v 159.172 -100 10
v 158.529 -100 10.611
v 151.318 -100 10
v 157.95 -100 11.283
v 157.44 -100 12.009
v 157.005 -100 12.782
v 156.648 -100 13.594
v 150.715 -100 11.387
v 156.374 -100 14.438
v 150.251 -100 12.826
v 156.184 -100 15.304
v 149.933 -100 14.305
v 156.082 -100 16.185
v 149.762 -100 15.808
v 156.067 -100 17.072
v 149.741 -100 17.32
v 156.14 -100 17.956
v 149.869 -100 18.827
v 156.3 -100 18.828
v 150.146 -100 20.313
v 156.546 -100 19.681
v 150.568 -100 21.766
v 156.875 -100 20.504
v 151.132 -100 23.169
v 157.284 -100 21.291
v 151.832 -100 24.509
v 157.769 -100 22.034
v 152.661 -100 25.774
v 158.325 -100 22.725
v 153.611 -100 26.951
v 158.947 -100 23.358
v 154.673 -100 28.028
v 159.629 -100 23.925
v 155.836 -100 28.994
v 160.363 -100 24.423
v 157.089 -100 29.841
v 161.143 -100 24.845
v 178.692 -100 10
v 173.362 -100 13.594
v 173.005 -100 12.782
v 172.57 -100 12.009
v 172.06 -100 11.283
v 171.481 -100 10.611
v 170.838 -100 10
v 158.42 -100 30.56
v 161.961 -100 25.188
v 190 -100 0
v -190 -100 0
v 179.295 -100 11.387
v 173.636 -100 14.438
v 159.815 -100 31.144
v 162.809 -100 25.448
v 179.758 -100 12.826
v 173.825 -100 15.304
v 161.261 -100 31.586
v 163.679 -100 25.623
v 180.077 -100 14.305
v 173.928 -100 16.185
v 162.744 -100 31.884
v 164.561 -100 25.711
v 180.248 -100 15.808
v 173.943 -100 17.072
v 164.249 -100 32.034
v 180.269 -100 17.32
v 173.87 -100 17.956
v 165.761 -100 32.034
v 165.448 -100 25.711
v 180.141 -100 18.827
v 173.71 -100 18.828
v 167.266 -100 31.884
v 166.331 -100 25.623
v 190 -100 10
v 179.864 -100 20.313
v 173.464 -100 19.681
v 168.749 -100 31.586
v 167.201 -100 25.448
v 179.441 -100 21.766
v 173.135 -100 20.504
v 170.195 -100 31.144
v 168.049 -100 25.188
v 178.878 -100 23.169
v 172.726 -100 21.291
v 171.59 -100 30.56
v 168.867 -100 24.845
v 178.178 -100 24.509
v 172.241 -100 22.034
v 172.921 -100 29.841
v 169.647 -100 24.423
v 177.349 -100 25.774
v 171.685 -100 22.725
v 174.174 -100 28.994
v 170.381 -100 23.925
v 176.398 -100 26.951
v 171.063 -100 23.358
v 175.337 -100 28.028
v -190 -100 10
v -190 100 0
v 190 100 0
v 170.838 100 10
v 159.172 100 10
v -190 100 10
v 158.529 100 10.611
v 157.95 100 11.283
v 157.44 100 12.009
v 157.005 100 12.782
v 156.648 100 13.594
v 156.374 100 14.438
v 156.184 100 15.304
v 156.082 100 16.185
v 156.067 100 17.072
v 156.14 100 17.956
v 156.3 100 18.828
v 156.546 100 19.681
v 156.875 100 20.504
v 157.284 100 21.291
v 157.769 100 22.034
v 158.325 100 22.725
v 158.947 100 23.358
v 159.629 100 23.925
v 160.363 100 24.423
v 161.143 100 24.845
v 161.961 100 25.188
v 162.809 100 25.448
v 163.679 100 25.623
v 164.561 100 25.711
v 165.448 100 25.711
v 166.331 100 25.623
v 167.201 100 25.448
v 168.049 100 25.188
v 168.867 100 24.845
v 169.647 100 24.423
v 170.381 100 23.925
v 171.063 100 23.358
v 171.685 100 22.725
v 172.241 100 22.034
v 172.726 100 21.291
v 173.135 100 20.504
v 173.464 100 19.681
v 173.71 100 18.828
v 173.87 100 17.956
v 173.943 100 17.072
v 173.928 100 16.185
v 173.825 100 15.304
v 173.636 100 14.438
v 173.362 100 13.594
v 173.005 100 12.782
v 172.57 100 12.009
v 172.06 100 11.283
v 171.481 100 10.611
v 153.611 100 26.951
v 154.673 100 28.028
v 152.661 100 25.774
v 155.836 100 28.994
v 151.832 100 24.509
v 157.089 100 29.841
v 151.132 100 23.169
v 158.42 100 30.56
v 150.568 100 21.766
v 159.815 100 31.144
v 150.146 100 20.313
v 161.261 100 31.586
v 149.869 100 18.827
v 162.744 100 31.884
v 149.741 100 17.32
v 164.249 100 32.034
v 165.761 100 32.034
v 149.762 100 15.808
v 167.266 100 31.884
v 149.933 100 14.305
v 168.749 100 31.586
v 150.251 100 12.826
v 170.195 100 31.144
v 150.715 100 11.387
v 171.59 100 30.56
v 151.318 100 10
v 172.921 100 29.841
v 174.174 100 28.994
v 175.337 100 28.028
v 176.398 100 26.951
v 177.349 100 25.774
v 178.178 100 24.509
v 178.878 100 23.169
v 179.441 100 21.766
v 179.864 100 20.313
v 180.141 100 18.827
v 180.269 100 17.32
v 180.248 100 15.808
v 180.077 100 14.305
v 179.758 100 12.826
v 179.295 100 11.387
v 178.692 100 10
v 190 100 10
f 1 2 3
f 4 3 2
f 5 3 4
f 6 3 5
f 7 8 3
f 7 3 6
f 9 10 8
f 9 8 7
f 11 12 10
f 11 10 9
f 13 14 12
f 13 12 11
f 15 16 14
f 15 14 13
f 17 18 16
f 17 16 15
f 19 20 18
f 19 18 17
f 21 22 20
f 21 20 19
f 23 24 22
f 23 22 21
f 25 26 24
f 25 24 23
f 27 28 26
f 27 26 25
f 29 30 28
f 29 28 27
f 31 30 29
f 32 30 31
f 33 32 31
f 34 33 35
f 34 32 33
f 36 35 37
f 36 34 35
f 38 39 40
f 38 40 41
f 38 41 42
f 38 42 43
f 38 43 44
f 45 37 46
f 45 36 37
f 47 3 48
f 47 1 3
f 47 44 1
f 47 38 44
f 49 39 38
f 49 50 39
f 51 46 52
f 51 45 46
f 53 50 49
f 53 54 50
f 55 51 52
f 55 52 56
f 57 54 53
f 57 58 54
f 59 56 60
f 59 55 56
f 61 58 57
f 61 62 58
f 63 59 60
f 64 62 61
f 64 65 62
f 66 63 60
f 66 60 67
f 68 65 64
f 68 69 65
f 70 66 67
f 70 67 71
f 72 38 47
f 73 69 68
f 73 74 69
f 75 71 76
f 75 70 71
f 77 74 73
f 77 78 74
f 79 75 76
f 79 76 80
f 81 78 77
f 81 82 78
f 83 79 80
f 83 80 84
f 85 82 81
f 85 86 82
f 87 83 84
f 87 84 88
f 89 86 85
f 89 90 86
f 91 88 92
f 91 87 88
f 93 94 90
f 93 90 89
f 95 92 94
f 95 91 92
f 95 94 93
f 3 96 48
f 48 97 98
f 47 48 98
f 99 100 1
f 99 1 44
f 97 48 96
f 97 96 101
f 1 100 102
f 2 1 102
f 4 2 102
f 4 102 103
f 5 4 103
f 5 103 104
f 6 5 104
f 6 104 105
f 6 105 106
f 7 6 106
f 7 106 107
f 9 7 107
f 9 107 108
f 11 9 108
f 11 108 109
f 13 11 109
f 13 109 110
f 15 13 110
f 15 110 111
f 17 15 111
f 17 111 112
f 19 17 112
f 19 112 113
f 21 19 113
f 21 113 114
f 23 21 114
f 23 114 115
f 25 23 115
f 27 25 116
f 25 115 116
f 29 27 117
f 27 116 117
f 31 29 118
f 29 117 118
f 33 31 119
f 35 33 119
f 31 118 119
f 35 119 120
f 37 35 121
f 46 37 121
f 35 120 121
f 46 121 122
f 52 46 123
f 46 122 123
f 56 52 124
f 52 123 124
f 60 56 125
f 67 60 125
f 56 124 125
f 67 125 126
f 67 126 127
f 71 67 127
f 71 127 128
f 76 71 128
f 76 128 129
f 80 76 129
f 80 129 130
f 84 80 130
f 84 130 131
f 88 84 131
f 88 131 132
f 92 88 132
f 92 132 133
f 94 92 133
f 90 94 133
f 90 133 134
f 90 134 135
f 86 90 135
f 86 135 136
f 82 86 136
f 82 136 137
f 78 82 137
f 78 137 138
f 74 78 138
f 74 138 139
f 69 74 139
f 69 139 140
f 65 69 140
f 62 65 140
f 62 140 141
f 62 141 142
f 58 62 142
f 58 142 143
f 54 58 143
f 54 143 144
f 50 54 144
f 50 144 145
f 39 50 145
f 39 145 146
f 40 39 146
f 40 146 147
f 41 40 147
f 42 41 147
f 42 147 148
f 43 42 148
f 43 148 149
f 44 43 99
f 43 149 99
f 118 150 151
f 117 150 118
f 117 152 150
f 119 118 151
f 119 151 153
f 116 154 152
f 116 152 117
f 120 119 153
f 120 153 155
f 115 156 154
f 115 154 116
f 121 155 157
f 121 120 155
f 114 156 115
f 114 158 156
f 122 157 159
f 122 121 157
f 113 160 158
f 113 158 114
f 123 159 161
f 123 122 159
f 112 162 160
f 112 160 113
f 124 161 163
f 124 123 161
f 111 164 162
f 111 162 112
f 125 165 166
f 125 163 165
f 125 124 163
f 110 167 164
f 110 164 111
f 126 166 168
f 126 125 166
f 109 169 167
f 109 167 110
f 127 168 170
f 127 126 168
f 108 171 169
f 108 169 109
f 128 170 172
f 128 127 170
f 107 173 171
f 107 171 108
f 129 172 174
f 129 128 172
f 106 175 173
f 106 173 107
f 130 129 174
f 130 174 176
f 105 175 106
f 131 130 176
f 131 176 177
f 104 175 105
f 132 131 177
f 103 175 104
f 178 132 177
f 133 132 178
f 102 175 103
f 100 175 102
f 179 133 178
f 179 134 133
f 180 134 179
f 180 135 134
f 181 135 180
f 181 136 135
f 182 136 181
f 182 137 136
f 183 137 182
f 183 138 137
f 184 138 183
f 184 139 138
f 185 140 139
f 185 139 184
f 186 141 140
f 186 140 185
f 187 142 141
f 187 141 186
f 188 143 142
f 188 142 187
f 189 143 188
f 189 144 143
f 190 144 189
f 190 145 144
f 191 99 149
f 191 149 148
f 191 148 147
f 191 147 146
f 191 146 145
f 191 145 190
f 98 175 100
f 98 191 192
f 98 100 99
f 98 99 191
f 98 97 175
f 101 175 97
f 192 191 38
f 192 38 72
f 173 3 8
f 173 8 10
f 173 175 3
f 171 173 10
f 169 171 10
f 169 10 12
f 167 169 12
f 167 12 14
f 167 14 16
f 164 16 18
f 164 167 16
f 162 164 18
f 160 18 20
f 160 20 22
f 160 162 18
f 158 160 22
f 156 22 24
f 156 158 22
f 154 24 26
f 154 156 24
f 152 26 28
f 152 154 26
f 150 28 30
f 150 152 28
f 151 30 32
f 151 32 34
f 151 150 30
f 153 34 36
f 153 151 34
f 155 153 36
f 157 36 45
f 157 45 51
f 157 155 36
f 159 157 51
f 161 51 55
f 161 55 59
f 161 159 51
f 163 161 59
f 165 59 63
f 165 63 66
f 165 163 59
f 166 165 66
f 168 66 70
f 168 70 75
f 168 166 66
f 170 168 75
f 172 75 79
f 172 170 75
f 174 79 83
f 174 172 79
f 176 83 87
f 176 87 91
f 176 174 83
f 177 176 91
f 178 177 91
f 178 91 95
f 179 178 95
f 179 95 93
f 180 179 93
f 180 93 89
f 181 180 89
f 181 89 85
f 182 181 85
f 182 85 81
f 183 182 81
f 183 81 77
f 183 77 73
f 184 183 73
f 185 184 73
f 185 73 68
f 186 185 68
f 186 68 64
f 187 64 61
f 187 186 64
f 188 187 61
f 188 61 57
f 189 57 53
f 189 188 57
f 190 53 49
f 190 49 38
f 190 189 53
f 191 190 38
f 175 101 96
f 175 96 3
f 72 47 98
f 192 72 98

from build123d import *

# Parameters (mm, degrees)
SKETCH1_W                       = 380
SKETCH1_H                       = 200
FOOT_DEPTH                      = 10
BOSS_EXTRUDE2_REACH             = 216.942
SKETCH2_R                       = 15.273641531
SKETCH2_R_2                     = 8.942985805
BOSS_EXTRUDE2_DIRECTION_2_REACH = 216.942


with BuildPart() as part:
    # Sketch1 → Foot (new body)
    with BuildSketch(Plane.XY):
        Rectangle(SKETCH1_W, SKETCH1_H)
    extrude(amount=FOOT_DEPTH)

    # Boss-Extrude2: up to this face of the body (flat: up to its plane)
    boss_extrude2_end = Plane(part.part.faces().sort_by_distance((0, 100, 5))[0])
    # Sketch2 → Boss-Extrude2 (add, up to the picked face)
    with BuildSketch(Plane(origin=(0, 0, 0), x_dir=(1, 0, 0), z_dir=(0, 1, 0)), mode=Mode.PRIVATE) as boss_extrude2_sk1:
        with Locations((165.004857041, -16.778784358)):
            Circle(SKETCH2_R)
        with Locations((165.004857041, -16.778784358)):
            Circle(SKETCH2_R_2, mode=Mode.SUBTRACT)
    boss_extrude2_tool1 = split(extrude(boss_extrude2_sk1.sketch, amount=BOSS_EXTRUDE2_REACH, mode=Mode.PRIVATE), bisect_by=boss_extrude2_end, keep=Keep.BOTH, mode=Mode.PRIVATE)
    add(boss_extrude2_tool1.solids().sort_by(Axis((150.163219, 0, 16.778784), (0, 1, 0)))[0])

    # Boss-Extrude2 direction 2: up to this face of the body (flat: up to its plane)
    boss_extrude2_direction_2_end = Plane(part.part.faces().sort_by_distance((0, -100, 5))[0])
    # Sketch2 → Boss-Extrude2 direction 2 (add, up to the picked face)
    with BuildSketch(Plane(origin=(0, 0, 0), x_dir=(1, 0, 0), z_dir=(0, 1, 0)), mode=Mode.PRIVATE) as boss_extrude2_direction_2_sk1:
        with Locations((165.004857041, -16.778784358)):
            Circle(SKETCH2_R)
        with Locations((165.004857041, -16.778784358)):
            Circle(SKETCH2_R_2, mode=Mode.SUBTRACT)
    boss_extrude2_direction_2_tool1 = split(extrude(boss_extrude2_direction_2_sk1.sketch, amount=-BOSS_EXTRUDE2_DIRECTION_2_REACH, mode=Mode.PRIVATE), bisect_by=boss_extrude2_direction_2_end, keep=Keep.BOTH, mode=Mode.PRIVATE)
    add(boss_extrude2_direction_2_tool1.solids().sort_by(Axis((150.163219, 0, 16.778784), (0, -1, 0)))[0])


solid = part.part
